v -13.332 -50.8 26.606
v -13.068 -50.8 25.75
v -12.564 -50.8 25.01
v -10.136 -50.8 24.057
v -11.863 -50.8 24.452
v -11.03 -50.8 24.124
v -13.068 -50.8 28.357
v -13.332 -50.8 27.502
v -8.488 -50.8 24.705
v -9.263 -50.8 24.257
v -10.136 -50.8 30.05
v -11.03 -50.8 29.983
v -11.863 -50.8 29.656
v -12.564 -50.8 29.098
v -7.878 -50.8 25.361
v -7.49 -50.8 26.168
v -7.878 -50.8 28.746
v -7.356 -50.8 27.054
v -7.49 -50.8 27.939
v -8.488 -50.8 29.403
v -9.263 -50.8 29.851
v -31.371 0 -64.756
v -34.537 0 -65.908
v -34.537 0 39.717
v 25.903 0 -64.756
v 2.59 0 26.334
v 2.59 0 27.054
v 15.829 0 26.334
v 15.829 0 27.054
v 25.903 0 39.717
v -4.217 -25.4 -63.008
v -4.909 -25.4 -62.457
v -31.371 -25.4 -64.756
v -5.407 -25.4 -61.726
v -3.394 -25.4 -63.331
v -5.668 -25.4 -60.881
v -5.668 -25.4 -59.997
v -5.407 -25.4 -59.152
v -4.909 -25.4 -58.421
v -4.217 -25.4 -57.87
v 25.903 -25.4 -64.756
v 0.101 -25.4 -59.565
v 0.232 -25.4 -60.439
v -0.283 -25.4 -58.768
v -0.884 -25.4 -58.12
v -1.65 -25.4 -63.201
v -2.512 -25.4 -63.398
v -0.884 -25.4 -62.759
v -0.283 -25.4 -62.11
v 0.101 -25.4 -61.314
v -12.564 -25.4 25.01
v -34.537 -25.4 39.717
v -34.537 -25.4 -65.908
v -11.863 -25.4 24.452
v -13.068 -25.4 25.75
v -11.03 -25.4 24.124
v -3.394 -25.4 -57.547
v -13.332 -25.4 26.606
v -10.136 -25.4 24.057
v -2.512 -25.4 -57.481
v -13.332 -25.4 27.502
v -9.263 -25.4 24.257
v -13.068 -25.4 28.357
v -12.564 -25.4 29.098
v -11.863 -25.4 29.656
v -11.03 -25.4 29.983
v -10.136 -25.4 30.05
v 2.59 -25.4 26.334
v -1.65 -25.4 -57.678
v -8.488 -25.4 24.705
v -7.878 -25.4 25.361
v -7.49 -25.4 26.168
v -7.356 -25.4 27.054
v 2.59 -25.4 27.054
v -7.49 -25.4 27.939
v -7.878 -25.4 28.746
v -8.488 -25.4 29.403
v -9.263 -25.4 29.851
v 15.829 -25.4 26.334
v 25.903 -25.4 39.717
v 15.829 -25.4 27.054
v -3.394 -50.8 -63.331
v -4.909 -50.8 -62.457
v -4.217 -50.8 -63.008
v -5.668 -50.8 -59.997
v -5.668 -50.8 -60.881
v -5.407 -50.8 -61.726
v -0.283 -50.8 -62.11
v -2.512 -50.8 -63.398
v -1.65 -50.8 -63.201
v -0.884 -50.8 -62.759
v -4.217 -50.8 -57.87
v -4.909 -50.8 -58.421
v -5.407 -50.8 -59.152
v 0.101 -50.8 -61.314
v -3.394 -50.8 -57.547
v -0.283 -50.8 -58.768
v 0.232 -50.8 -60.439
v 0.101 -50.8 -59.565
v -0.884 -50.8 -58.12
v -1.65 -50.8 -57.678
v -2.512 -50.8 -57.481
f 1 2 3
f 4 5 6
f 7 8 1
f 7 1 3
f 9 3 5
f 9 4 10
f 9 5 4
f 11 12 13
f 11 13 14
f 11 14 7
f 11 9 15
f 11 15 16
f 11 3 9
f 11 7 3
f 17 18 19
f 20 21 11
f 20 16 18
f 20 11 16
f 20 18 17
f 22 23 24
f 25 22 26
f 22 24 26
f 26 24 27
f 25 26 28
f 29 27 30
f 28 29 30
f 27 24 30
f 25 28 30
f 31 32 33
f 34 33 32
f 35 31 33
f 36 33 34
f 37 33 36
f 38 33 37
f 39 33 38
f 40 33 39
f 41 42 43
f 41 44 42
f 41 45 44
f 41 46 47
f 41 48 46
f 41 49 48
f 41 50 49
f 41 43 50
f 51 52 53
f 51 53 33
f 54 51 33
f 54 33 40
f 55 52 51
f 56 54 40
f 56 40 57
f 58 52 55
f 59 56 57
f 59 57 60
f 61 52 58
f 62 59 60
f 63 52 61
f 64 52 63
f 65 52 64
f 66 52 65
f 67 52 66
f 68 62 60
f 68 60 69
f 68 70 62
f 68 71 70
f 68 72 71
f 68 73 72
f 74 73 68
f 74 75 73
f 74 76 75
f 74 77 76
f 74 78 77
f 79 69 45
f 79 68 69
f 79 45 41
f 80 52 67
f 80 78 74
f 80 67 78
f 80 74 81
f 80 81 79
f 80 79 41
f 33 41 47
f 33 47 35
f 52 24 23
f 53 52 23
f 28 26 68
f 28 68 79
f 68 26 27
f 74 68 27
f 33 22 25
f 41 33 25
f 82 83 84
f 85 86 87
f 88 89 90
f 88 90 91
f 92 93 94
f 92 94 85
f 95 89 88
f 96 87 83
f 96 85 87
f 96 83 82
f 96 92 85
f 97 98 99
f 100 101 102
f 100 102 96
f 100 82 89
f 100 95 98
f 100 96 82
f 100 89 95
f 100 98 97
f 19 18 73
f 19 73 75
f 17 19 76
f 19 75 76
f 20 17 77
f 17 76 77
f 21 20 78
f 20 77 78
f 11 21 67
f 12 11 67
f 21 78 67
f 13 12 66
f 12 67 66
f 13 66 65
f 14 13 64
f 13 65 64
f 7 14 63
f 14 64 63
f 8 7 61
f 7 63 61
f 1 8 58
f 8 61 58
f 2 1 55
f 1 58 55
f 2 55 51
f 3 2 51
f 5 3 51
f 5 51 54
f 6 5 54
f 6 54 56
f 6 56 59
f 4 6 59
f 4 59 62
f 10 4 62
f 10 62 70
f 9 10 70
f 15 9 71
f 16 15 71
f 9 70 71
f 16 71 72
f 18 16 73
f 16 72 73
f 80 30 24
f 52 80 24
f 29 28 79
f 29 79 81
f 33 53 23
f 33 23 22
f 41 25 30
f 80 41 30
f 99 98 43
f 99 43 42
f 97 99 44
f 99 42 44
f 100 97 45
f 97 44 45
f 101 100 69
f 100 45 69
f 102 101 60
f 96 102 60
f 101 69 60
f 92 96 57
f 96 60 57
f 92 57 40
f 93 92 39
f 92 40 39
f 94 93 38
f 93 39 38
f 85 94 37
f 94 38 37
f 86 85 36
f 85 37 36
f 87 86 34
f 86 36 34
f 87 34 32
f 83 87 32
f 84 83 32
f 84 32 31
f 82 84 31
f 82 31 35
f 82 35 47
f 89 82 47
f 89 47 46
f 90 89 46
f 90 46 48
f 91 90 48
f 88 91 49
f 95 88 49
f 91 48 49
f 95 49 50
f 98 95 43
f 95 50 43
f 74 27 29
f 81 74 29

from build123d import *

# Parameters (mm, degrees)
F0_W     = 57.2733432055
F0_H     = 100.7320135832
F0_W_2   = 13.239064021
F0_H_2   = 0.7195146754
F1_DEPTH = 25.4
F2_R     = 3.0047813391
F2_R_2   = 2.9666314484
F3_DEPTH = 25.4


with BuildPart() as f1:
    # F0 (on Front) → F1 (new body)
    with BuildSketch(Plane.XZ):
        Polygon((-34.5366895199, 39.7171974182), (-31.3708260655, 35.9757170081), (25.9025171399, 35.9757170081), (25.9025171399, 39.7171974182), align=None)
        with Locations((-2.7341544628, -14.3902897835)):
            Rectangle(F0_W, F0_H)
        with Locations((9.2097852612, 26.6939844005)):
            Rectangle(F0_W_2, F0_H_2, mode=Mode.SUBTRACT)
        Polygon((-31.3708260655, -64.7562965751), (-31.3708260655, 35.9757170081), (-34.5366895199, 39.7171974182), (-34.5366895199, -65.907523036), align=None)
    extrude(amount=F1_DEPTH)

    # F2 (on face) → F3 (join)
    with BuildSketch(Plane.XZ.offset(25.4)):
        with Locations((-10.3610074148, 27.0537417382)):
            Circle(F2_R)
        with Locations((-2.7341544628, -60.4392103851)):
            Circle(F2_R_2)
    extrude(amount=F3_DEPTH)


solid = f1.part
